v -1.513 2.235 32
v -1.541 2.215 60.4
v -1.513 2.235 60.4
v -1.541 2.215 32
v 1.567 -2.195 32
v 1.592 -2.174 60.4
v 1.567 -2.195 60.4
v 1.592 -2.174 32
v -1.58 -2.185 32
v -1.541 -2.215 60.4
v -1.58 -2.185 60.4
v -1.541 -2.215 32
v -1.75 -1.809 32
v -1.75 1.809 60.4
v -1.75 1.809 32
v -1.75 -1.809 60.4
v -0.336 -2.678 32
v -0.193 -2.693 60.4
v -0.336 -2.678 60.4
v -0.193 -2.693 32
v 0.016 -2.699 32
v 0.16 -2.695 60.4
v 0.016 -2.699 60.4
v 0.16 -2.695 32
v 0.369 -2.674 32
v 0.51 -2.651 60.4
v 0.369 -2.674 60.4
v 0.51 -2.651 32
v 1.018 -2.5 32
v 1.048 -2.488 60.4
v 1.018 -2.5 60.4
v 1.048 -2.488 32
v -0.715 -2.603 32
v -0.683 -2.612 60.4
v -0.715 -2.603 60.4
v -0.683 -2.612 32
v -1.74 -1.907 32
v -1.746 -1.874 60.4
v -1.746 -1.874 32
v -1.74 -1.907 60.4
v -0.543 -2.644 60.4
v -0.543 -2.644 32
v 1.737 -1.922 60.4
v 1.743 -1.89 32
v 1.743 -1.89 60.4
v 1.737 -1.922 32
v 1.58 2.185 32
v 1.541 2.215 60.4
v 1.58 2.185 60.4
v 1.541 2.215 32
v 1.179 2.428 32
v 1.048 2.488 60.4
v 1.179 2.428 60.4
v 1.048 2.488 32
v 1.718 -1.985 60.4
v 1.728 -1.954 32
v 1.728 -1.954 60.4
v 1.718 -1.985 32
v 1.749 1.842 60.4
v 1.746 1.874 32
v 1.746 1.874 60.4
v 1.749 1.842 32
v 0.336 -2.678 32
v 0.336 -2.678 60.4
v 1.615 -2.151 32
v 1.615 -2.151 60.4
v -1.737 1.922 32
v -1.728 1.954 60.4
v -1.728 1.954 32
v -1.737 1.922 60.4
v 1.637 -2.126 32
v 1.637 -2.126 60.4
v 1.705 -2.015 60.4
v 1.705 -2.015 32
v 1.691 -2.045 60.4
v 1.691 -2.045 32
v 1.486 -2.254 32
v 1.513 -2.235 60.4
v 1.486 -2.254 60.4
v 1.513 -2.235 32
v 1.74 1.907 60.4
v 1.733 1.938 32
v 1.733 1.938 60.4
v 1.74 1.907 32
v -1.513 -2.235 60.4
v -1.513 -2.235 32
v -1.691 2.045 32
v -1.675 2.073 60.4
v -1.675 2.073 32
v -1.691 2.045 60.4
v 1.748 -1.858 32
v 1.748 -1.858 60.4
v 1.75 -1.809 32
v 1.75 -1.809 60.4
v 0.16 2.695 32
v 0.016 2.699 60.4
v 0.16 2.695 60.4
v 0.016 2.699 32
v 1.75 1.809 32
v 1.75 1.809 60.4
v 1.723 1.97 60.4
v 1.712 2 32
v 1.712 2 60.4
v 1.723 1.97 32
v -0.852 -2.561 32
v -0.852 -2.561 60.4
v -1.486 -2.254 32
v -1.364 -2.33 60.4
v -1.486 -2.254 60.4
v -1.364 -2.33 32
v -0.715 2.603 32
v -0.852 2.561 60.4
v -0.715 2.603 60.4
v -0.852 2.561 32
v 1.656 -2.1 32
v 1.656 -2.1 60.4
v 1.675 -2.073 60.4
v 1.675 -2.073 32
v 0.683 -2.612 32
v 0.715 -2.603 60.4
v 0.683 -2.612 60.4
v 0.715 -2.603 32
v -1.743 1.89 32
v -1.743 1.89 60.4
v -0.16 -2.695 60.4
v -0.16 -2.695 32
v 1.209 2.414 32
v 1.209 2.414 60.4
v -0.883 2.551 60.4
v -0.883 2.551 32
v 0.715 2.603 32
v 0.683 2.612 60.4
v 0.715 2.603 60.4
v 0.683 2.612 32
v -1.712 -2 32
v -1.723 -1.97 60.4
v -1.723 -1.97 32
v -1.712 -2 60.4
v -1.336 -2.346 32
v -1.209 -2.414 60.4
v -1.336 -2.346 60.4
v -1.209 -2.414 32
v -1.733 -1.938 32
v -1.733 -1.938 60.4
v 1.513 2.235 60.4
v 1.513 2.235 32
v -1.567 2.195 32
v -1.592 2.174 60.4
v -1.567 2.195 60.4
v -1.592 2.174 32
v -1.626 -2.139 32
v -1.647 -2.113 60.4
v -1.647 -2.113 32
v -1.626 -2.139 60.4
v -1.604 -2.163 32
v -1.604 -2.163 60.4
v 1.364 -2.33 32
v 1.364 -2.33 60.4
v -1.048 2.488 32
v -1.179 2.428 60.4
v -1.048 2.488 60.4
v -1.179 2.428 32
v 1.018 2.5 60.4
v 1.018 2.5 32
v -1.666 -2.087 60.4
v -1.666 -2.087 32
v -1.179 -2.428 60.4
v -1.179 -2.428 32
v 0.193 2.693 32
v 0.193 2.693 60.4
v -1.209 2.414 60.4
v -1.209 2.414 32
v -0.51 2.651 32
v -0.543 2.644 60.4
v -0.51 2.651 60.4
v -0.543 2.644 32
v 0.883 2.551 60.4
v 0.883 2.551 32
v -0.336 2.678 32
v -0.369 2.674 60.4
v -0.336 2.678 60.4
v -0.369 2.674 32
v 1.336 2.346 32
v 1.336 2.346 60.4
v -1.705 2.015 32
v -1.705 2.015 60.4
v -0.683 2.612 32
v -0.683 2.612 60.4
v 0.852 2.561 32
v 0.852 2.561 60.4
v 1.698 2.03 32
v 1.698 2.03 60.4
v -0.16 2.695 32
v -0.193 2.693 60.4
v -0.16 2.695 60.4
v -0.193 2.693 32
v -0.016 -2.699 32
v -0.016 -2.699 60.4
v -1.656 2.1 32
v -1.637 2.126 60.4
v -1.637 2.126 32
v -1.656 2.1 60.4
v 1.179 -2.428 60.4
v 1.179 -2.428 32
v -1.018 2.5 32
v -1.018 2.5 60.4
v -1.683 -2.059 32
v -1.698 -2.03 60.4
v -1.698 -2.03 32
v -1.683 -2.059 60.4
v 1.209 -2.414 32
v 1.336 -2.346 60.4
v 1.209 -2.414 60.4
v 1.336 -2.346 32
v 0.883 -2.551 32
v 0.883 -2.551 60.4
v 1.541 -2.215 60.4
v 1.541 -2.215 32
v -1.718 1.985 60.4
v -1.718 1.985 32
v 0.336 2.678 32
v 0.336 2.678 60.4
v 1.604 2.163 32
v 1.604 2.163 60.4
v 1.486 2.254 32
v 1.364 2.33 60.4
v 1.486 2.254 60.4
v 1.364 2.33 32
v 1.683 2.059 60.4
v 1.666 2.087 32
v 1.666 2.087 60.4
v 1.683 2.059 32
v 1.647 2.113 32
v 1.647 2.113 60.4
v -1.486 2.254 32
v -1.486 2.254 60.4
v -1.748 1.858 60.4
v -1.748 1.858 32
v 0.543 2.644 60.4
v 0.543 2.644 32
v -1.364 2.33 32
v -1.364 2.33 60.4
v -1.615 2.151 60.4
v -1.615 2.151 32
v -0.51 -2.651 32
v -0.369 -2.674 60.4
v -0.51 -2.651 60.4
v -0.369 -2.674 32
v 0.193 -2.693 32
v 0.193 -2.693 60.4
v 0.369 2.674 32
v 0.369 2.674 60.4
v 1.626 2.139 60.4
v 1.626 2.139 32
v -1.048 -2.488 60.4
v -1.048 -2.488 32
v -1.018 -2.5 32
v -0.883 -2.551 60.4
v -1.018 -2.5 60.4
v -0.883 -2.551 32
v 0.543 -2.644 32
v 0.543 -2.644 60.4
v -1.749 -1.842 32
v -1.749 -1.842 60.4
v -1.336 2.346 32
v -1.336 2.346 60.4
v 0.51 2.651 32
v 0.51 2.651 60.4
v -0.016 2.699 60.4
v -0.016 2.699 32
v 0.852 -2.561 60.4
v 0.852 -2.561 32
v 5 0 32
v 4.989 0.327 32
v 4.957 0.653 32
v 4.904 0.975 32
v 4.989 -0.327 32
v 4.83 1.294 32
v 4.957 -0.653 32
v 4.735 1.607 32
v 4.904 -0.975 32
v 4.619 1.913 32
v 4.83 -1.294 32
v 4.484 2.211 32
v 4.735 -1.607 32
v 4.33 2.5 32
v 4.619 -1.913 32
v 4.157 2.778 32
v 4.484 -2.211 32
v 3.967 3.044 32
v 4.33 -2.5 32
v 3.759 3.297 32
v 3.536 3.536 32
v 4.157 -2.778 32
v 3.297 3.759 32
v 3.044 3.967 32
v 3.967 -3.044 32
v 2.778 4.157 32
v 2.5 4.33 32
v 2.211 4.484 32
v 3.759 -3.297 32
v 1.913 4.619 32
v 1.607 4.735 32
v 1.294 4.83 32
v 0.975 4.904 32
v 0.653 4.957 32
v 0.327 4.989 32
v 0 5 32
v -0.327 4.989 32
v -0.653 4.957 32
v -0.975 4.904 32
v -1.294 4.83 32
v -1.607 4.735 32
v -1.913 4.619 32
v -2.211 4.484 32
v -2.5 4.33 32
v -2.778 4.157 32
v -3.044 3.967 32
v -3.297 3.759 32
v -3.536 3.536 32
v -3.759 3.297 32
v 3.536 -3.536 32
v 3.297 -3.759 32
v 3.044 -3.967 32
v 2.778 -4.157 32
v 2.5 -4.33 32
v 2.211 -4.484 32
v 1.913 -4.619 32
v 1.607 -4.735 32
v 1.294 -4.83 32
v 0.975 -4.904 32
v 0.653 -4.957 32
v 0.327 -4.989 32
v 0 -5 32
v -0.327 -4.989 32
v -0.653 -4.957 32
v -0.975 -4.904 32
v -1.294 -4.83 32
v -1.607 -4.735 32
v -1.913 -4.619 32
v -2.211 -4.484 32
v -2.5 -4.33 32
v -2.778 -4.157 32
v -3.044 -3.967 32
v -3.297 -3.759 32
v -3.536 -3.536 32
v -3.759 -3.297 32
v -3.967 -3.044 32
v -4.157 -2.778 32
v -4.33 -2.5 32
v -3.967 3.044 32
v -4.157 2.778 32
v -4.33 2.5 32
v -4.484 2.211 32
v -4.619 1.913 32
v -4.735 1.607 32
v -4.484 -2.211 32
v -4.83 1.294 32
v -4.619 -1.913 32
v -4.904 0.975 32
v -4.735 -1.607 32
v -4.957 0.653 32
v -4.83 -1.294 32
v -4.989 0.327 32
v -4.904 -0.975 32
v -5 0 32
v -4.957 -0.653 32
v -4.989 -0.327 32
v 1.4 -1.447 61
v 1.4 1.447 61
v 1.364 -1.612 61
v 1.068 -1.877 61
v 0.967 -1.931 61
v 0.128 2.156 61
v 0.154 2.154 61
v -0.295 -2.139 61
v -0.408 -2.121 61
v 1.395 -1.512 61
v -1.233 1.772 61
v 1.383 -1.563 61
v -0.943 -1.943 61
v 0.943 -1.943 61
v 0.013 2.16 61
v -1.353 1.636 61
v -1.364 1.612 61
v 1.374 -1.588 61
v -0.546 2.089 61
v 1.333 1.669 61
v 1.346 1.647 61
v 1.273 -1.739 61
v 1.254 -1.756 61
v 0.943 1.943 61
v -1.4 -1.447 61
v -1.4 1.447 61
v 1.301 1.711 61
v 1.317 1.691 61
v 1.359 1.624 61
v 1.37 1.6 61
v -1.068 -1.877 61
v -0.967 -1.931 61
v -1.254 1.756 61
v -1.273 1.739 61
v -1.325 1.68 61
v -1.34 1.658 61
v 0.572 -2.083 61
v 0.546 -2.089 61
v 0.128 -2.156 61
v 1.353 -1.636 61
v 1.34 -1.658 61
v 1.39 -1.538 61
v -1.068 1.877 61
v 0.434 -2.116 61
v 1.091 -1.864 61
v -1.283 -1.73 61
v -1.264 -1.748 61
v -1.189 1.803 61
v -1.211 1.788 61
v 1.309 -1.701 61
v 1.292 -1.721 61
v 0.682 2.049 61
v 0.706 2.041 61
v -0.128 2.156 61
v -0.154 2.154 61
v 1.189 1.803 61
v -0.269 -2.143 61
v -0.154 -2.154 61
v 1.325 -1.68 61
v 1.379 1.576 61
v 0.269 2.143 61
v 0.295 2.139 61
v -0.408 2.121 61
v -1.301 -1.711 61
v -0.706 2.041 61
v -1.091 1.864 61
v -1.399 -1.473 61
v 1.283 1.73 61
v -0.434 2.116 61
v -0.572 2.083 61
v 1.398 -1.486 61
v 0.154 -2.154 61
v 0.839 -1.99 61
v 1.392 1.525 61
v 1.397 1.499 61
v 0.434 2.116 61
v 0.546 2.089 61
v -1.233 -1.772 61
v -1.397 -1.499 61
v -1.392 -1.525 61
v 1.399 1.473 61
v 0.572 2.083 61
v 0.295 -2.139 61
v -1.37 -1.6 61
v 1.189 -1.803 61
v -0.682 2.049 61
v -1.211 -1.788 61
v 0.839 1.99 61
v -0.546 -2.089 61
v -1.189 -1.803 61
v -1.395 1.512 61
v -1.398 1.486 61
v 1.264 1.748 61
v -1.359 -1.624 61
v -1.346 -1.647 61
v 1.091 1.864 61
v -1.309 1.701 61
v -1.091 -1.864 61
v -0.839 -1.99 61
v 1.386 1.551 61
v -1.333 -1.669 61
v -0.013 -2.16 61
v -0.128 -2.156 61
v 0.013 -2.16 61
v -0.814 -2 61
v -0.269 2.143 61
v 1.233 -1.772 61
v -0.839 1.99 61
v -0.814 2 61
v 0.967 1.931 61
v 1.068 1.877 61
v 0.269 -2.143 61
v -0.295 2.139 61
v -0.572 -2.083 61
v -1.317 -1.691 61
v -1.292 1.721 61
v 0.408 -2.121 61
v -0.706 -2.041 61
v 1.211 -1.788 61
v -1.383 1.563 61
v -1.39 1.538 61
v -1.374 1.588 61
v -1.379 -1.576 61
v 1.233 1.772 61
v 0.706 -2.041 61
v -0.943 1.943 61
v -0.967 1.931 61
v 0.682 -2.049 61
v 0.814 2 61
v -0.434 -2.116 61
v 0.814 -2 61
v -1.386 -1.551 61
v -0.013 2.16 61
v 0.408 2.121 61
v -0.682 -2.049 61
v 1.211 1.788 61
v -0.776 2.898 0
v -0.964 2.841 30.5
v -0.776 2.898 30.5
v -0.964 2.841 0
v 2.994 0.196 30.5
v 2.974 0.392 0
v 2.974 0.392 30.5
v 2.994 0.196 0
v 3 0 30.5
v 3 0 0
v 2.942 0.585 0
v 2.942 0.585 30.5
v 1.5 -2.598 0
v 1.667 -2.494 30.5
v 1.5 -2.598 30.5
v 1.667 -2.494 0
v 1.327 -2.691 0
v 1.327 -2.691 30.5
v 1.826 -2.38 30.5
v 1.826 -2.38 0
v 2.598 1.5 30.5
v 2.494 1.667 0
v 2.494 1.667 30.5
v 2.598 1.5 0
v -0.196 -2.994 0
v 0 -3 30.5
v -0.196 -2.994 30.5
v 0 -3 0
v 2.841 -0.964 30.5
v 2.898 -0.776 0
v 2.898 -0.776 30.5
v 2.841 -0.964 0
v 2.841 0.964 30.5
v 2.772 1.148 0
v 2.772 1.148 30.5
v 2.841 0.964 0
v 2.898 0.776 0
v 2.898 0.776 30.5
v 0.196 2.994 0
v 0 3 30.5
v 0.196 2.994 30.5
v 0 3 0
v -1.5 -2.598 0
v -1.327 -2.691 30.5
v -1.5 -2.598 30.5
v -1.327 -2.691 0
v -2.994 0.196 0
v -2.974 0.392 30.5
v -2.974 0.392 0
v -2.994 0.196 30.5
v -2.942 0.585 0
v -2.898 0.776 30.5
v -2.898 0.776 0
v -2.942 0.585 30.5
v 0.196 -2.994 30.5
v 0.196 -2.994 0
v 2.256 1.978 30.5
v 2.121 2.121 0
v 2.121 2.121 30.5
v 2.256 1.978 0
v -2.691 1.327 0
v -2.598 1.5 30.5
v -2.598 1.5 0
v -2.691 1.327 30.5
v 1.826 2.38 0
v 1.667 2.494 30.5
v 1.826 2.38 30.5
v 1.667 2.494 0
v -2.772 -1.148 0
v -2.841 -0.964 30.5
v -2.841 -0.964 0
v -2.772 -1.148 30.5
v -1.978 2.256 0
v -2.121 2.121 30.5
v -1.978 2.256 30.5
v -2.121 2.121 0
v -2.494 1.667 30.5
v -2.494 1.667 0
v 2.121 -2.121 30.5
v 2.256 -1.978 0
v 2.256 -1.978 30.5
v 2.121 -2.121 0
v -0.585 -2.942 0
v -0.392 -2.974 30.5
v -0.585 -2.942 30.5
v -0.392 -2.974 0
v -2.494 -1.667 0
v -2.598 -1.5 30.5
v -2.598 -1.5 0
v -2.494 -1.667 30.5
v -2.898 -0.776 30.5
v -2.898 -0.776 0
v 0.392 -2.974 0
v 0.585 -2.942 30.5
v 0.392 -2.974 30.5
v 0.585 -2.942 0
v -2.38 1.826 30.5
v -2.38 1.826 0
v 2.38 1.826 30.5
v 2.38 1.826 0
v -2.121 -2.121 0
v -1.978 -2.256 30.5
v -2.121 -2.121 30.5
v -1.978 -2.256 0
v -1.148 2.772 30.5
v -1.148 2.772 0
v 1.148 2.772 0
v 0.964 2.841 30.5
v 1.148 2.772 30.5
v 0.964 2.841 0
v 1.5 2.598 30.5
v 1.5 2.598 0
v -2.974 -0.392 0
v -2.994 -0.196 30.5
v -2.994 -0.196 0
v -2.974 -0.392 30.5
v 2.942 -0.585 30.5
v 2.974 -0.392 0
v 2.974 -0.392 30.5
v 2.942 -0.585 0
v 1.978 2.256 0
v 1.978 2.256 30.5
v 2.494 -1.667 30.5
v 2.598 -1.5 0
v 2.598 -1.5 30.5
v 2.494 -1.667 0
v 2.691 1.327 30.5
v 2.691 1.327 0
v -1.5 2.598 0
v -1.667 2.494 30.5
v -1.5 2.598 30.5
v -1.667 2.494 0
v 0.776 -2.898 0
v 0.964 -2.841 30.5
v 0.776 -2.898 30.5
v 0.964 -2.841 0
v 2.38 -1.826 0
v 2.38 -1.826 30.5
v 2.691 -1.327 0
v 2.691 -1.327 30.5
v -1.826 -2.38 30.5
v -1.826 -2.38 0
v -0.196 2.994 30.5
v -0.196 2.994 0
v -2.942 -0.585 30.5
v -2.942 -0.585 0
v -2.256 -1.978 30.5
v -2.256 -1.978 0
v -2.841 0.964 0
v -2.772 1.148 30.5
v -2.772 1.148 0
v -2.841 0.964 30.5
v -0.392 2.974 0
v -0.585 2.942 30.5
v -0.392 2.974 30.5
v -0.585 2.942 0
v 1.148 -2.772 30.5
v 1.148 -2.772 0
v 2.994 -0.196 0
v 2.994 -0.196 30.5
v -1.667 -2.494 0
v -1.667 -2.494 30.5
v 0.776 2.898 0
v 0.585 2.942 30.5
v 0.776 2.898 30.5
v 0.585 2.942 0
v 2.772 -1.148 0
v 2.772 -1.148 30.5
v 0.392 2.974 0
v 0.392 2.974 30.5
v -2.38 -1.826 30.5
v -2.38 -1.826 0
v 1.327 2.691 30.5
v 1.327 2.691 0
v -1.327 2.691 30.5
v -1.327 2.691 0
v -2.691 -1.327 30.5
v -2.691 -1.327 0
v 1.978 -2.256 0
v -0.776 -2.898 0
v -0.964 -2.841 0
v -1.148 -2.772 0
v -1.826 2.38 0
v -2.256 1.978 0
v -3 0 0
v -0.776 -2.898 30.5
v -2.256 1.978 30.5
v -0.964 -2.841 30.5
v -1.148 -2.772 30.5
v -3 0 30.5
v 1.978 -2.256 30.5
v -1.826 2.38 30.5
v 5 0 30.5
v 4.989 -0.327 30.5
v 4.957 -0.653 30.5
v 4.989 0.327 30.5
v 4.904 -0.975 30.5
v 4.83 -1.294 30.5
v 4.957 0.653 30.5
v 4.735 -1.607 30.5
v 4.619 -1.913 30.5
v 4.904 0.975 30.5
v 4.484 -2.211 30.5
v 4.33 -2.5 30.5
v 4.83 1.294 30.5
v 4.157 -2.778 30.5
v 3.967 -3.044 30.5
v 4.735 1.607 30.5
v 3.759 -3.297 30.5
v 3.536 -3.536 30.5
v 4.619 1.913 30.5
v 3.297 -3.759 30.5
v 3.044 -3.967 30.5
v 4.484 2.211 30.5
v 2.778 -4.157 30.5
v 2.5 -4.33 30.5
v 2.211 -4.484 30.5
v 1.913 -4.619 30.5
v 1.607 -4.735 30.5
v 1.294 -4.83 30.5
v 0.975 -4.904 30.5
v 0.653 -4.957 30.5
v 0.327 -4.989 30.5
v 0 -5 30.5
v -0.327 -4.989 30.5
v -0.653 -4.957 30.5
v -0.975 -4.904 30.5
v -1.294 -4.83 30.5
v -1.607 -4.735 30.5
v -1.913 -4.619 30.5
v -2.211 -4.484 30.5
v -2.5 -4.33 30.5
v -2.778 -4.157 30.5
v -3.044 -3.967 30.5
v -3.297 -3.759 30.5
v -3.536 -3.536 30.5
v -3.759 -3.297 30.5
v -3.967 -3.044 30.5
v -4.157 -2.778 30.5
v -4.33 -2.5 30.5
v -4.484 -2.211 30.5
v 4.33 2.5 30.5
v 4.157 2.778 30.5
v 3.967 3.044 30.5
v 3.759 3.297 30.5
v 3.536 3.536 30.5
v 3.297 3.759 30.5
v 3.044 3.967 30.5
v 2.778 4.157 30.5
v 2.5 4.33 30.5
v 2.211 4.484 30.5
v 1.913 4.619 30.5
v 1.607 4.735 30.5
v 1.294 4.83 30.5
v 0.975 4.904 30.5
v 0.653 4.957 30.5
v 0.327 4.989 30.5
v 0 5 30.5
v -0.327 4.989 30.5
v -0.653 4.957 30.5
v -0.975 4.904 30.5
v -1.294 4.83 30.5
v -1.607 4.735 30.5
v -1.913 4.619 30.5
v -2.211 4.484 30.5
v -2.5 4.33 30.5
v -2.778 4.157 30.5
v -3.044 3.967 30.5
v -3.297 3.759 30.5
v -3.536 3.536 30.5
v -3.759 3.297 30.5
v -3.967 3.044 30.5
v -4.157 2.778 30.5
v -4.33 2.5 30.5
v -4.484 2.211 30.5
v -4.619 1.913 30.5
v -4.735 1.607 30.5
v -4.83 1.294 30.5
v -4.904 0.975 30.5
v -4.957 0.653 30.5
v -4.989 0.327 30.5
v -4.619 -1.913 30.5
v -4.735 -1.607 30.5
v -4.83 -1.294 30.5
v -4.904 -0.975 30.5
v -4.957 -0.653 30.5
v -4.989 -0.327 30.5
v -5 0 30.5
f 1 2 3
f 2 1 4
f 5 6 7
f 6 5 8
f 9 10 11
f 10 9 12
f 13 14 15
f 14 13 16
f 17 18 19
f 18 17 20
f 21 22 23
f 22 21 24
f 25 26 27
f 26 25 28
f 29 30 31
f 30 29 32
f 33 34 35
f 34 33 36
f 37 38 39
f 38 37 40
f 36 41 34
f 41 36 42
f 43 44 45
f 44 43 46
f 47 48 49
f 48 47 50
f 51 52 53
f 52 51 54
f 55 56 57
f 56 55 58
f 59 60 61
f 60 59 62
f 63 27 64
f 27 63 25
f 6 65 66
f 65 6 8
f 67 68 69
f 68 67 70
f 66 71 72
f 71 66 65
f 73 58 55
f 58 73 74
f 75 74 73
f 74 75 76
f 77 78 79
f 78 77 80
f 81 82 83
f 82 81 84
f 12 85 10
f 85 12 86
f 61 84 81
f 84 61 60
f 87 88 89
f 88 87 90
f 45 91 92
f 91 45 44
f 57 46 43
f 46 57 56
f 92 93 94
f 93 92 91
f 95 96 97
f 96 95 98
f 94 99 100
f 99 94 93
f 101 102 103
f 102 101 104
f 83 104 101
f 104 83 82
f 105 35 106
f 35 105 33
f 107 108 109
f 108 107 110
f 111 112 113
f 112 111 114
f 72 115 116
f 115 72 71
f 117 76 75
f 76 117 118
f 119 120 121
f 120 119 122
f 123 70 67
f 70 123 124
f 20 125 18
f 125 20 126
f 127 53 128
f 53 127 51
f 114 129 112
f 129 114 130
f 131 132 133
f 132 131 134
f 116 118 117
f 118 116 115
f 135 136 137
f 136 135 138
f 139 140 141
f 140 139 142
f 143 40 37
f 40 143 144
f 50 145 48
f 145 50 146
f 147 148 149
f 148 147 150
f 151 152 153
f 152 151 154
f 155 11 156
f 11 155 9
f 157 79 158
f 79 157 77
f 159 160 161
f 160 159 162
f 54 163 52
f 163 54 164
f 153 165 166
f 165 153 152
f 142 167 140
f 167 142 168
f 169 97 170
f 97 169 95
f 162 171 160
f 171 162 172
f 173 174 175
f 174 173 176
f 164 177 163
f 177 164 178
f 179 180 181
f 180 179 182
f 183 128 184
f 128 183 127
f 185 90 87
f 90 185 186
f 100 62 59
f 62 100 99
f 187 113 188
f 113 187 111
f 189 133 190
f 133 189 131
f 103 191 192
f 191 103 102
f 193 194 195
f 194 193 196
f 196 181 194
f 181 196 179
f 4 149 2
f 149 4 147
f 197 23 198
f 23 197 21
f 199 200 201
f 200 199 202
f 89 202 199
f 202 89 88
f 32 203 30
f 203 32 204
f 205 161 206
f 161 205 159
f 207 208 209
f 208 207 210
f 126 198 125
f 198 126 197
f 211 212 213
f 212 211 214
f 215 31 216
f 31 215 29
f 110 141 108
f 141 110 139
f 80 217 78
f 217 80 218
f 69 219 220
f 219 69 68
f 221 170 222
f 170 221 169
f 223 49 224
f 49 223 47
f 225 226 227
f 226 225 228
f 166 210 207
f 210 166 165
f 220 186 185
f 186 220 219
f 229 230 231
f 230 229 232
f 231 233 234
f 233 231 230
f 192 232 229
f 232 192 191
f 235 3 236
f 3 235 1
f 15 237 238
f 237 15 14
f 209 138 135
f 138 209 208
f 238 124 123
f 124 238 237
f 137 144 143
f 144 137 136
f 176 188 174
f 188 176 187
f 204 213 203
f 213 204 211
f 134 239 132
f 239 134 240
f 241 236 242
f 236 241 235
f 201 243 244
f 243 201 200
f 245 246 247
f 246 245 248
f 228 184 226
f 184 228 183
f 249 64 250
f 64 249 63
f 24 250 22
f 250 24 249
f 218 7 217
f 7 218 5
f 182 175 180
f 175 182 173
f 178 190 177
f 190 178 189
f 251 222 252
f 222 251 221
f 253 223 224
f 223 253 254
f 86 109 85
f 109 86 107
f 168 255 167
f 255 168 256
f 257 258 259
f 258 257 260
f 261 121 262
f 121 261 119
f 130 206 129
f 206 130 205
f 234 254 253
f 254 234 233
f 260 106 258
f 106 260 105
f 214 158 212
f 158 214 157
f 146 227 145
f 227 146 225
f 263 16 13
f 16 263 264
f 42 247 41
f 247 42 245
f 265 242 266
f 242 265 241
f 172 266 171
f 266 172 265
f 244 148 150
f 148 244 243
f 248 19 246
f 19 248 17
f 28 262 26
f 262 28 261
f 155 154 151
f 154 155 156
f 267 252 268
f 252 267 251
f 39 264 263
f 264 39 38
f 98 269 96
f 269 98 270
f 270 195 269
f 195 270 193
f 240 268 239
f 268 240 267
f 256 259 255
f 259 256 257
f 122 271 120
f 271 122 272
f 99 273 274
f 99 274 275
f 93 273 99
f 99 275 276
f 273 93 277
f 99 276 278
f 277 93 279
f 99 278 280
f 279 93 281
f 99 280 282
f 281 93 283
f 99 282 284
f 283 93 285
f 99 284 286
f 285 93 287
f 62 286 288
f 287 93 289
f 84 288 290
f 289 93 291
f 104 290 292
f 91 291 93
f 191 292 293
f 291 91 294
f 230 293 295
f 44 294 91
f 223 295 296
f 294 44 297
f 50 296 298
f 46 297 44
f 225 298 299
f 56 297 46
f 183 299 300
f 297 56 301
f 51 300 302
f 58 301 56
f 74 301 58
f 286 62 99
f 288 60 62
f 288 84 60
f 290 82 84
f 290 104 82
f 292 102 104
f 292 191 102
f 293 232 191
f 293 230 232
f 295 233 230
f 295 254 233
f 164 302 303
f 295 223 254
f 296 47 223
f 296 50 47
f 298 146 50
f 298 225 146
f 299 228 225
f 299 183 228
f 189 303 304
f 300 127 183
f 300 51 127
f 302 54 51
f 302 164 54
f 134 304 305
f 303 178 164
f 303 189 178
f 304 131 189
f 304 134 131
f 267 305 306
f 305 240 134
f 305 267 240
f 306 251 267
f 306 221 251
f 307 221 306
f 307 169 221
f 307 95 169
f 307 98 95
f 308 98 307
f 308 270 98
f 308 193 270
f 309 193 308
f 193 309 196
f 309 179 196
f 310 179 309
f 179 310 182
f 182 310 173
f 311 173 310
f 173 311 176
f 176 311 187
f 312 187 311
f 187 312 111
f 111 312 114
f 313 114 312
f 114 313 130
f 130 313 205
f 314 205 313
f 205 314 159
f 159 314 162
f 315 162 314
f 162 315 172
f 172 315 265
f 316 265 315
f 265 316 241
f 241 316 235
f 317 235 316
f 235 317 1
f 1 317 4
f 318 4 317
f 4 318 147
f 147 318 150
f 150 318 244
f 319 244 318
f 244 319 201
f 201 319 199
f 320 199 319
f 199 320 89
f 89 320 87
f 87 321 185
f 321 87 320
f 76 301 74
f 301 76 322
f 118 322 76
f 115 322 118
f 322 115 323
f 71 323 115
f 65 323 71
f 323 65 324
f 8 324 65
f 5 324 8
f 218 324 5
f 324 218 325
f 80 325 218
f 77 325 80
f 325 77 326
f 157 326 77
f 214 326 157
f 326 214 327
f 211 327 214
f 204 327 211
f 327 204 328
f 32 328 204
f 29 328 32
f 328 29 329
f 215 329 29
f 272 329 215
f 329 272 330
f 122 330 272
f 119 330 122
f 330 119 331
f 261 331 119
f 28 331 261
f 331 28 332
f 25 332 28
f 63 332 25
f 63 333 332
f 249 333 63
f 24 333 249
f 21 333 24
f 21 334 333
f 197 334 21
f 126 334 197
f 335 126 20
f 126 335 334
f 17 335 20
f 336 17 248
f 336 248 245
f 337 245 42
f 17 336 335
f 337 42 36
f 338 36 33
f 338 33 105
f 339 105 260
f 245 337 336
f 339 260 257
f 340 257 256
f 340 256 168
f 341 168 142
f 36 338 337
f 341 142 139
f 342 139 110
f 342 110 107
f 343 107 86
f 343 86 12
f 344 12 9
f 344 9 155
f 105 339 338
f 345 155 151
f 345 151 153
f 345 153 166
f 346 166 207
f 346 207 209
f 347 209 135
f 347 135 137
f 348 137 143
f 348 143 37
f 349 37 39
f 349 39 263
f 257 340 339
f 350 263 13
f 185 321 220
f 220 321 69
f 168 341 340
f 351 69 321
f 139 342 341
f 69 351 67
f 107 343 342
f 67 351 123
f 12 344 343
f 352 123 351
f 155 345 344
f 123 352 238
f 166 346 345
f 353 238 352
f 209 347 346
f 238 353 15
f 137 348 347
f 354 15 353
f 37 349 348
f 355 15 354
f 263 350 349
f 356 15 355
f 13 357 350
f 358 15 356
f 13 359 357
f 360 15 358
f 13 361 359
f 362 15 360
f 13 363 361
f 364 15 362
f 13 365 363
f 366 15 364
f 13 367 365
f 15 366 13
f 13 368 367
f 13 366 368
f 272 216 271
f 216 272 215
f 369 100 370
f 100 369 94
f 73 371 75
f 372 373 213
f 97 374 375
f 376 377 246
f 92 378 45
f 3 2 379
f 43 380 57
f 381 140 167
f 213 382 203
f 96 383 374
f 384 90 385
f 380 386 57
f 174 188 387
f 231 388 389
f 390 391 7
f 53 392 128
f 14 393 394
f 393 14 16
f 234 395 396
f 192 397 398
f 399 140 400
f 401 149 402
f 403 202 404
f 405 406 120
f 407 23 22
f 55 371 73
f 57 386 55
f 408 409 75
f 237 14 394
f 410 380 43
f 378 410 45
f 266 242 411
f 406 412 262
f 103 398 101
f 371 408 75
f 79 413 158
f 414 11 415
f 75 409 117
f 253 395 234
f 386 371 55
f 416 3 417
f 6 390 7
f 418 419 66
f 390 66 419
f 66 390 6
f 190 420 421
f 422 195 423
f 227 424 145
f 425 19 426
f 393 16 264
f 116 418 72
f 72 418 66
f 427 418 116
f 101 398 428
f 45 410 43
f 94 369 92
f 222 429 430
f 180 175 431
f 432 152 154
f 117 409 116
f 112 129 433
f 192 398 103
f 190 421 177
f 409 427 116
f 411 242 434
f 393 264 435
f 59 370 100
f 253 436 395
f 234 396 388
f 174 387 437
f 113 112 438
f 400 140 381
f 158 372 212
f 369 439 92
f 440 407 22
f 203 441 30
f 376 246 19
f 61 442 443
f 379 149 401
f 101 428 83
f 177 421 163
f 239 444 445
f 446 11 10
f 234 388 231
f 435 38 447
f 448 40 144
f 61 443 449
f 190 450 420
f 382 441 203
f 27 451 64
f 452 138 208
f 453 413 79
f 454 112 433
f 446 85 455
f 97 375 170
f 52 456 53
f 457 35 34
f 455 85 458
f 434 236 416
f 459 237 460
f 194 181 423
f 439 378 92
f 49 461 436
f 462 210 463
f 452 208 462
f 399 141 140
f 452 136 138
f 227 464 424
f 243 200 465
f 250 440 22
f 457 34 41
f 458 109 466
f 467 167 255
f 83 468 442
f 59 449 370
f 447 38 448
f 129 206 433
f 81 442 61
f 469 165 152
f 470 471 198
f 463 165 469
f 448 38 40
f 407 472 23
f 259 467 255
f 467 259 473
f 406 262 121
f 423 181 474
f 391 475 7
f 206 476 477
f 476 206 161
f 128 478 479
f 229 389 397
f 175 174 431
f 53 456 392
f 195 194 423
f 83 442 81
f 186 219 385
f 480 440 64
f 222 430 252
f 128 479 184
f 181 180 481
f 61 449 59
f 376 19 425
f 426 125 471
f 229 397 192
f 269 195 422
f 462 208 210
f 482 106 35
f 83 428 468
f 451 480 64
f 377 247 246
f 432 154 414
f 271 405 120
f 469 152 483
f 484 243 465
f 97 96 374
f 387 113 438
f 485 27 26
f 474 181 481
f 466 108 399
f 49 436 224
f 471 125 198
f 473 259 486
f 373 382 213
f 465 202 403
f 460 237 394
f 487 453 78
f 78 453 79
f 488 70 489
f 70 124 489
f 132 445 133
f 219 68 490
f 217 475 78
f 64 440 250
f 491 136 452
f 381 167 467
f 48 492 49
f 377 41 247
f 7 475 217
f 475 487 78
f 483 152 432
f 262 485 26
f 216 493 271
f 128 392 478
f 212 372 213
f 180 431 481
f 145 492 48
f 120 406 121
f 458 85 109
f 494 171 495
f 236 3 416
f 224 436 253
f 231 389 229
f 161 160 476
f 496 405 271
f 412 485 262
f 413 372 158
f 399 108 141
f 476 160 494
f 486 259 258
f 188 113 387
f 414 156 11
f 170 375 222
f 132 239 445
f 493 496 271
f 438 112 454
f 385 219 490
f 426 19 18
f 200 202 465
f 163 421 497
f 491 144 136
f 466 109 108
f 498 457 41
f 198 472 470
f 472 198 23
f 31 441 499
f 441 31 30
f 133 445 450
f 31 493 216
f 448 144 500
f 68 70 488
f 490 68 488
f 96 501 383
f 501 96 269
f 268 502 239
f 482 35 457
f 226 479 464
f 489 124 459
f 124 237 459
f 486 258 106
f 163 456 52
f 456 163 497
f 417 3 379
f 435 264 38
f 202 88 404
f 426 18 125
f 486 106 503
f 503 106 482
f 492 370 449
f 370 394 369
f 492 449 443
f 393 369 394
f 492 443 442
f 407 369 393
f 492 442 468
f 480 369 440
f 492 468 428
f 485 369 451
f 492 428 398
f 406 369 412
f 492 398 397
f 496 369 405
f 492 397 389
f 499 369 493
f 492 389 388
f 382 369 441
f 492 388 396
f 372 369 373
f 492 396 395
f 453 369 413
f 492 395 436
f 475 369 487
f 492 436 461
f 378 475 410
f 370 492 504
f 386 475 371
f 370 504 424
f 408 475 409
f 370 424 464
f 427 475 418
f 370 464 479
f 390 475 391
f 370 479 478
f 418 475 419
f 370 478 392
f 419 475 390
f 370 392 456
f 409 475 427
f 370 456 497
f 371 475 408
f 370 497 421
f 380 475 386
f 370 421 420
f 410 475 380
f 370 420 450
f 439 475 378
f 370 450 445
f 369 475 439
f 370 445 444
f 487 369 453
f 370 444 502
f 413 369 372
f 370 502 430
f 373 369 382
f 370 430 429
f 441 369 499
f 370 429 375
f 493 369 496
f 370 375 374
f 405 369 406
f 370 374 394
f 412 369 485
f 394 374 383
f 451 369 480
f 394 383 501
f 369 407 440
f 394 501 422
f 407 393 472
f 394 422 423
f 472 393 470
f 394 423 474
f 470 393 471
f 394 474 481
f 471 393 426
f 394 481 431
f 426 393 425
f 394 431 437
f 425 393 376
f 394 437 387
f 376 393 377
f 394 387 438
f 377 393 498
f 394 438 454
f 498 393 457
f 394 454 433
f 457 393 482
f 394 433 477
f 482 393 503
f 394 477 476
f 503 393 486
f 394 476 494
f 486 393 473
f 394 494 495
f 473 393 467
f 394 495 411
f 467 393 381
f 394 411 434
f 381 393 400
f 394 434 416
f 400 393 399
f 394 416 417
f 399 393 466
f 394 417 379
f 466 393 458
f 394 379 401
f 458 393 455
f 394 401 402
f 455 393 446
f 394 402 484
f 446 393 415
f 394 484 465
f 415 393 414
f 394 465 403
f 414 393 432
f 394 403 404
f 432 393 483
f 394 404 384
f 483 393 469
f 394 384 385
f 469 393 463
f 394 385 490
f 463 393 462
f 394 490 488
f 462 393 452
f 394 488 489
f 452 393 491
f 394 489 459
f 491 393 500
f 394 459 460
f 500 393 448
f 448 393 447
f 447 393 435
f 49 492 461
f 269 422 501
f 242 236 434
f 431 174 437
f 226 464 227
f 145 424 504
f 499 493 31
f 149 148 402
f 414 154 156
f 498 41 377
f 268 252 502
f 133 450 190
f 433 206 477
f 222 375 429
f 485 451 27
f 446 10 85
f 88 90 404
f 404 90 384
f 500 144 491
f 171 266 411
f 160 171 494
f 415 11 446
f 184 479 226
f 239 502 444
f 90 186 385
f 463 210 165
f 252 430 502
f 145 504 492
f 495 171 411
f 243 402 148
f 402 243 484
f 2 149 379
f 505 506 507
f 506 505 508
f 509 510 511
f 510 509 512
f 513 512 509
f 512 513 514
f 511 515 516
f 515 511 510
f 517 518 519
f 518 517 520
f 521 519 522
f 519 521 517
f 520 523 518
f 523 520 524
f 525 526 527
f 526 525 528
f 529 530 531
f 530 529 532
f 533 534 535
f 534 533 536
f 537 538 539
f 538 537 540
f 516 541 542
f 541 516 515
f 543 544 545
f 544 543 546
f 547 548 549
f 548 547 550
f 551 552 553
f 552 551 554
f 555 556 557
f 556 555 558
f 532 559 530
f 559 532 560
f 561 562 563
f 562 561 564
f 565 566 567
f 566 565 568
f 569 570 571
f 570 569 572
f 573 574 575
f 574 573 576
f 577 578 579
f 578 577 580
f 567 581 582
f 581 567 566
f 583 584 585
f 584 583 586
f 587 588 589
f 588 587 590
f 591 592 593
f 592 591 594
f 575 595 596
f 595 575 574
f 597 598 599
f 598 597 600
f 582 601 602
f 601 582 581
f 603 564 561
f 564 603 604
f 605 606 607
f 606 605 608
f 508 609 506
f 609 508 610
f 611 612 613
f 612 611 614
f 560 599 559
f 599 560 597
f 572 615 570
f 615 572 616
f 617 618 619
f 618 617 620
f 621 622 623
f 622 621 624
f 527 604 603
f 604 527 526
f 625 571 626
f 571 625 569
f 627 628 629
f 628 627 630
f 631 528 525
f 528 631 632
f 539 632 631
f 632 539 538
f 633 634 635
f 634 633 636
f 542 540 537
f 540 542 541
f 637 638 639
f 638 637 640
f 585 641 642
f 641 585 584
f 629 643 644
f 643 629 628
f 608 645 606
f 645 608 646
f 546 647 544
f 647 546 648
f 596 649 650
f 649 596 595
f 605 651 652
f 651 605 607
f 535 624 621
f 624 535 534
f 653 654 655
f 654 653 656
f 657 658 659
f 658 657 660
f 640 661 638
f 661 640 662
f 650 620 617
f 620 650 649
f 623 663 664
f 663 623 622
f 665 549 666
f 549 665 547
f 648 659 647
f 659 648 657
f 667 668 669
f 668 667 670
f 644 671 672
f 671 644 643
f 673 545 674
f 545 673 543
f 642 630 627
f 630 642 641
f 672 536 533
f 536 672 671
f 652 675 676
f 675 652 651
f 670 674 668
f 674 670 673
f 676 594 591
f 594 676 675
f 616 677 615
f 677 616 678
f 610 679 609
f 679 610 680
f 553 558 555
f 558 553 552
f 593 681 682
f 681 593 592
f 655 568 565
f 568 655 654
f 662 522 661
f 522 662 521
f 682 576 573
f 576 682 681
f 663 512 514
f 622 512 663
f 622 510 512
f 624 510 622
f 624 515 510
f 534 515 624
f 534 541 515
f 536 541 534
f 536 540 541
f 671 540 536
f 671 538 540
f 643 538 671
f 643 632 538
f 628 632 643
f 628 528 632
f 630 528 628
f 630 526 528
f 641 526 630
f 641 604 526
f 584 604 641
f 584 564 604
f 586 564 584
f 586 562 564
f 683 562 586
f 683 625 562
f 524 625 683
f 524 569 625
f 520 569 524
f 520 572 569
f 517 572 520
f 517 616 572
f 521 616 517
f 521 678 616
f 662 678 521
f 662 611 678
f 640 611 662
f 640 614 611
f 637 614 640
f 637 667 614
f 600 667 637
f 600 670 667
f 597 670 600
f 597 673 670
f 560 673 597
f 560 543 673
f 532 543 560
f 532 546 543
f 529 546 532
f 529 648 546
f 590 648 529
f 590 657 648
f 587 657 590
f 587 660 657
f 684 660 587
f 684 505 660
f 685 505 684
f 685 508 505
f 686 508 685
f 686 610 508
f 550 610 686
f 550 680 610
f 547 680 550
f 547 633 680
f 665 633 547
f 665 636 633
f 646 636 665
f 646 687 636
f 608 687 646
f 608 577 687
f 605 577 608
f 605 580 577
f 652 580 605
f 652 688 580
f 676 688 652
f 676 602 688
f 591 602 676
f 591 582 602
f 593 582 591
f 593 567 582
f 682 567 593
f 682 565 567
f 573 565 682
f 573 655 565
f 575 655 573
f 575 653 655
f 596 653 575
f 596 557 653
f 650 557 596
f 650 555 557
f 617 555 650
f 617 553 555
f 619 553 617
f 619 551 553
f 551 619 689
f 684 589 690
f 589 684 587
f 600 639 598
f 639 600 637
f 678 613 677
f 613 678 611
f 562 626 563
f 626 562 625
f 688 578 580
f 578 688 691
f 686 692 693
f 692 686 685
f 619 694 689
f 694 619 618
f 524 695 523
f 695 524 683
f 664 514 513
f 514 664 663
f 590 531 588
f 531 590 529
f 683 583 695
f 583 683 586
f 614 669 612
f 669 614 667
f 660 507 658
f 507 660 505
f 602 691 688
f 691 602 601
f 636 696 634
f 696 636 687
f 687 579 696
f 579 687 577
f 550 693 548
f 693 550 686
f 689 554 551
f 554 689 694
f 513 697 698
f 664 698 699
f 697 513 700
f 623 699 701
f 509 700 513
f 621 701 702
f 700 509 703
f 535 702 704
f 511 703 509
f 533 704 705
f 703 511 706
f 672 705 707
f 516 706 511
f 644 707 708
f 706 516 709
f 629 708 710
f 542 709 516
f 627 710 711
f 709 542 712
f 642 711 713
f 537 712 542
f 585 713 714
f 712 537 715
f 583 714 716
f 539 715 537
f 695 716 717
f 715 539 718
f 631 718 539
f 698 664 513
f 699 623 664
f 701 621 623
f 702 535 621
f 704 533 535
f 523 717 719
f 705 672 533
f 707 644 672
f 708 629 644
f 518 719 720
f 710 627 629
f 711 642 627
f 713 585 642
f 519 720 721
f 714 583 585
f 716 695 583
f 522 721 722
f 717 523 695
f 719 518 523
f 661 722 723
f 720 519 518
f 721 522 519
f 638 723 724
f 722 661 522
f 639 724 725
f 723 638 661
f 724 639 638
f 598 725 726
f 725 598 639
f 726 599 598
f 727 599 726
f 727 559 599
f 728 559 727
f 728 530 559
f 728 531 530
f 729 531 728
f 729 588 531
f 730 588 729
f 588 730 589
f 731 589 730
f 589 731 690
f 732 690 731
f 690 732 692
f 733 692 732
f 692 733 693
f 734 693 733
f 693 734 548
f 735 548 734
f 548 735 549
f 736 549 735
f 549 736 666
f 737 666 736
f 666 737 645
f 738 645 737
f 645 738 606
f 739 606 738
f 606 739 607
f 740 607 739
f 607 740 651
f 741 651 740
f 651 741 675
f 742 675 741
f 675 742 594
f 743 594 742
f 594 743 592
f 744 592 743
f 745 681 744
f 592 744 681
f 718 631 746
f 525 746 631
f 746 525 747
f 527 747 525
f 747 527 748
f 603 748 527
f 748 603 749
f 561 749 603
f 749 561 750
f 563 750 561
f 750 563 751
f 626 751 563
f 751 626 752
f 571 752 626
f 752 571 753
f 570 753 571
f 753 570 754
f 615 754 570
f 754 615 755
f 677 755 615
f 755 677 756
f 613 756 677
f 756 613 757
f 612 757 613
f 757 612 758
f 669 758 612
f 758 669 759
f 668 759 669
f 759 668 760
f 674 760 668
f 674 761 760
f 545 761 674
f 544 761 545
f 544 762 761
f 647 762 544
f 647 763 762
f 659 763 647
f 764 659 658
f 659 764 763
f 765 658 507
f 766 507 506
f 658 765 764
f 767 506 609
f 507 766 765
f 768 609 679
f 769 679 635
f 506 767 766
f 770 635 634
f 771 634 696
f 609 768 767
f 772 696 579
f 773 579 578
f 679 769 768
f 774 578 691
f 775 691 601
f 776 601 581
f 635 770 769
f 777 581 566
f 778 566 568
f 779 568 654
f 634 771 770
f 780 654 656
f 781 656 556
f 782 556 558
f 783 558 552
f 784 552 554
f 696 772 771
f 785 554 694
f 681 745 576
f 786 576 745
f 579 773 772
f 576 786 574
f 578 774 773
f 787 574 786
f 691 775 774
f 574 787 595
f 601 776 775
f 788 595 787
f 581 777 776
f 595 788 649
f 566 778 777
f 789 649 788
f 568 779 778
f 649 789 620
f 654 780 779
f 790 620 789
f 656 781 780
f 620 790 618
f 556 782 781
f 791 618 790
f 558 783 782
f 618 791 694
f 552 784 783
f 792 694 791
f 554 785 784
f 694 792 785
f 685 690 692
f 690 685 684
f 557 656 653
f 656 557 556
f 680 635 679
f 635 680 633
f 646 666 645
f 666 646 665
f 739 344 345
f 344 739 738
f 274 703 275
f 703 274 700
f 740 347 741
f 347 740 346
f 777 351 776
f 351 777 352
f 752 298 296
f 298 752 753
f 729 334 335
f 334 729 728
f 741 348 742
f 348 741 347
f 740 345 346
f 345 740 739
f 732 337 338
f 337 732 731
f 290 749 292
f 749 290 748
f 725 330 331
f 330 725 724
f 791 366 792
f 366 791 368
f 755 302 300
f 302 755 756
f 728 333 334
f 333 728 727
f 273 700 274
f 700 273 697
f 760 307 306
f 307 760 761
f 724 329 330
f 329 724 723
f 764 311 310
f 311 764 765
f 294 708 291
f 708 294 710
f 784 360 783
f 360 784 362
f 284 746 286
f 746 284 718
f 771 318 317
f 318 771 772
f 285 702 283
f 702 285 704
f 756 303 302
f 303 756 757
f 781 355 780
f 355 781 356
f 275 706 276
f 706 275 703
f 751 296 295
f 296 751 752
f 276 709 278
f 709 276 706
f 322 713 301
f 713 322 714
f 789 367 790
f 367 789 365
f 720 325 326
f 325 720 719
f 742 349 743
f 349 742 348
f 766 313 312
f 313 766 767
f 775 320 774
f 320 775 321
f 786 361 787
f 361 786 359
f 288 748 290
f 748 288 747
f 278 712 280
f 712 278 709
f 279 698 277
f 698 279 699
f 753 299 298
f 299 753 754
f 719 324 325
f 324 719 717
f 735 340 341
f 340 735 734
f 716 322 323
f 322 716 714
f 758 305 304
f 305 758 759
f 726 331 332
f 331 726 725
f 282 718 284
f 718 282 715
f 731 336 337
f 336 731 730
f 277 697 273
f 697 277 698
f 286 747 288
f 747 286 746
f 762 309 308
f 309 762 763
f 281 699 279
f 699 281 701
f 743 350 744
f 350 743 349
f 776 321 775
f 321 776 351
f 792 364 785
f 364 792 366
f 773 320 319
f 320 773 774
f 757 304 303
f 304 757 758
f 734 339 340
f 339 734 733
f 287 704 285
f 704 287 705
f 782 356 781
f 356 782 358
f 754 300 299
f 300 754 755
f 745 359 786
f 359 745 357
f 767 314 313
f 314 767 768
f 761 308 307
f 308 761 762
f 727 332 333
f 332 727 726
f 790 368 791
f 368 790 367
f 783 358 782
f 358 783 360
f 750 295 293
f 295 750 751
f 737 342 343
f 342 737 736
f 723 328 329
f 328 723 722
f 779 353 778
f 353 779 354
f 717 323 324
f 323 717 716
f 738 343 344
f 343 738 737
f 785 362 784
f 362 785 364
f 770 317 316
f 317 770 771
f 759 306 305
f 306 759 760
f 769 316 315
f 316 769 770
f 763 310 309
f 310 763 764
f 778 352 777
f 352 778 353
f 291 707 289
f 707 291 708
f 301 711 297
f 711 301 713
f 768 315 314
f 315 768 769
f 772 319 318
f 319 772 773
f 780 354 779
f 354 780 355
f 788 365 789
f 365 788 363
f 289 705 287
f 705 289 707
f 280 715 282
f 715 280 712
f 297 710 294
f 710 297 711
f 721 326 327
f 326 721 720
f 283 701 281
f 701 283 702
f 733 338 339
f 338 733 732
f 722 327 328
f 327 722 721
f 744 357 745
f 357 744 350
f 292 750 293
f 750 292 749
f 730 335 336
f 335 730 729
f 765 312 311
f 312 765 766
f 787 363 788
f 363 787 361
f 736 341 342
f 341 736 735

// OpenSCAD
// ======================================================================
//  ВІСЬ ВІЛЬНОГО КОЛЕСА v5 (жовті TT-колеса з магазину) · sosny · Day 2
//
//  Як перша вісь із free_wheel.scad, але:
//   - D-кінець під конектор колеса на 20 мм довший (29 мм) і «кругліший»:
//     лиски 3.5 замість 3.0 + заокруглені кути → щільніше сидить у колесі;
//   - шайба-стопер є ТІЛЬКИ біля колеса; з іншого боку вал гладкий, тож вісь
//     просовується крізь тримач ззовні всередину рами;
//   - на внутрішній кінець надягається окремий stopper і приклеюється /
//     припаюється → вісь разом із колесом не вилітає.
//  Тримач (holder у free_wheel.scad, отвір Ø6.5) НЕ міняється.
//
//  Друк: PLA 0.2, 4 стінки, 100 %, без підтримок.
//  Вісь — СТОЯЧИ на торці вала (D-кінець угору), brim 5 мм, 2 шт разом.
//  Стопер — пласкою стороною на стіл.
// ======================================================================

part = "axle";     // "axle" або "stopper"

// --- D-кінець під колесо ---
hub_d    = 5.4;    // круглий діаметр
hub_flat = 3.5;    // між лисками (перша вісь 3.0 — колесо люфтило)
corner_r = 0.5;    // заокруглення кутів D-профілю
hub_len  = 29;     // було 9 → +20 мм

// --- шайба-стопер біля колеса ---
washer_d = 10;  washer_t = 1.5;

// --- вал у тримачі ---
ax_d     = 6;      // отвір тримача Ø6.5
block_y  = 25.4;   // товщина тримача
play     = 0.6;
stop_t   = 3;      // товщина окремого стопера
tail     = 1.5;    // запас за стопером
shaft_len = block_y + play + stop_t + tail;   // 30.5

stop_d   = 10;
stop_fit = 0.2;    // отвір стопера Ø6.2 — щільно, під клей

$fn = 96;

module d_profile() {
    offset(r = corner_r) offset(delta = -corner_r)
        intersection() {
            circle(d = hub_d);
            square([hub_flat, hub_d + 1], center = true);
        }
}

module axle() {
    // друк стоячи на торці вала: вал → шайба → D-кінець угору
    cylinder(d = ax_d, h = shaft_len);
    translate([0, 0, shaft_len]) cylinder(d = washer_d, h = washer_t);
    translate([0, 0, shaft_len + washer_t]) {
        linear_extrude(hub_len - 0.6) d_profile();
        translate([0, 0, hub_len - 0.6]) linear_extrude(0.6, scale = 0.8) d_profile(); // фаска
    }
}

module stopper() {
    difference() {
        cylinder(d = stop_d, h = stop_t);
        translate([0, 0, -1]) cylinder(d = ax_d + stop_fit, h = stop_t + 2);
    }
}

if (part == "axle")    axle();
if (part == "stopper") stopper();
